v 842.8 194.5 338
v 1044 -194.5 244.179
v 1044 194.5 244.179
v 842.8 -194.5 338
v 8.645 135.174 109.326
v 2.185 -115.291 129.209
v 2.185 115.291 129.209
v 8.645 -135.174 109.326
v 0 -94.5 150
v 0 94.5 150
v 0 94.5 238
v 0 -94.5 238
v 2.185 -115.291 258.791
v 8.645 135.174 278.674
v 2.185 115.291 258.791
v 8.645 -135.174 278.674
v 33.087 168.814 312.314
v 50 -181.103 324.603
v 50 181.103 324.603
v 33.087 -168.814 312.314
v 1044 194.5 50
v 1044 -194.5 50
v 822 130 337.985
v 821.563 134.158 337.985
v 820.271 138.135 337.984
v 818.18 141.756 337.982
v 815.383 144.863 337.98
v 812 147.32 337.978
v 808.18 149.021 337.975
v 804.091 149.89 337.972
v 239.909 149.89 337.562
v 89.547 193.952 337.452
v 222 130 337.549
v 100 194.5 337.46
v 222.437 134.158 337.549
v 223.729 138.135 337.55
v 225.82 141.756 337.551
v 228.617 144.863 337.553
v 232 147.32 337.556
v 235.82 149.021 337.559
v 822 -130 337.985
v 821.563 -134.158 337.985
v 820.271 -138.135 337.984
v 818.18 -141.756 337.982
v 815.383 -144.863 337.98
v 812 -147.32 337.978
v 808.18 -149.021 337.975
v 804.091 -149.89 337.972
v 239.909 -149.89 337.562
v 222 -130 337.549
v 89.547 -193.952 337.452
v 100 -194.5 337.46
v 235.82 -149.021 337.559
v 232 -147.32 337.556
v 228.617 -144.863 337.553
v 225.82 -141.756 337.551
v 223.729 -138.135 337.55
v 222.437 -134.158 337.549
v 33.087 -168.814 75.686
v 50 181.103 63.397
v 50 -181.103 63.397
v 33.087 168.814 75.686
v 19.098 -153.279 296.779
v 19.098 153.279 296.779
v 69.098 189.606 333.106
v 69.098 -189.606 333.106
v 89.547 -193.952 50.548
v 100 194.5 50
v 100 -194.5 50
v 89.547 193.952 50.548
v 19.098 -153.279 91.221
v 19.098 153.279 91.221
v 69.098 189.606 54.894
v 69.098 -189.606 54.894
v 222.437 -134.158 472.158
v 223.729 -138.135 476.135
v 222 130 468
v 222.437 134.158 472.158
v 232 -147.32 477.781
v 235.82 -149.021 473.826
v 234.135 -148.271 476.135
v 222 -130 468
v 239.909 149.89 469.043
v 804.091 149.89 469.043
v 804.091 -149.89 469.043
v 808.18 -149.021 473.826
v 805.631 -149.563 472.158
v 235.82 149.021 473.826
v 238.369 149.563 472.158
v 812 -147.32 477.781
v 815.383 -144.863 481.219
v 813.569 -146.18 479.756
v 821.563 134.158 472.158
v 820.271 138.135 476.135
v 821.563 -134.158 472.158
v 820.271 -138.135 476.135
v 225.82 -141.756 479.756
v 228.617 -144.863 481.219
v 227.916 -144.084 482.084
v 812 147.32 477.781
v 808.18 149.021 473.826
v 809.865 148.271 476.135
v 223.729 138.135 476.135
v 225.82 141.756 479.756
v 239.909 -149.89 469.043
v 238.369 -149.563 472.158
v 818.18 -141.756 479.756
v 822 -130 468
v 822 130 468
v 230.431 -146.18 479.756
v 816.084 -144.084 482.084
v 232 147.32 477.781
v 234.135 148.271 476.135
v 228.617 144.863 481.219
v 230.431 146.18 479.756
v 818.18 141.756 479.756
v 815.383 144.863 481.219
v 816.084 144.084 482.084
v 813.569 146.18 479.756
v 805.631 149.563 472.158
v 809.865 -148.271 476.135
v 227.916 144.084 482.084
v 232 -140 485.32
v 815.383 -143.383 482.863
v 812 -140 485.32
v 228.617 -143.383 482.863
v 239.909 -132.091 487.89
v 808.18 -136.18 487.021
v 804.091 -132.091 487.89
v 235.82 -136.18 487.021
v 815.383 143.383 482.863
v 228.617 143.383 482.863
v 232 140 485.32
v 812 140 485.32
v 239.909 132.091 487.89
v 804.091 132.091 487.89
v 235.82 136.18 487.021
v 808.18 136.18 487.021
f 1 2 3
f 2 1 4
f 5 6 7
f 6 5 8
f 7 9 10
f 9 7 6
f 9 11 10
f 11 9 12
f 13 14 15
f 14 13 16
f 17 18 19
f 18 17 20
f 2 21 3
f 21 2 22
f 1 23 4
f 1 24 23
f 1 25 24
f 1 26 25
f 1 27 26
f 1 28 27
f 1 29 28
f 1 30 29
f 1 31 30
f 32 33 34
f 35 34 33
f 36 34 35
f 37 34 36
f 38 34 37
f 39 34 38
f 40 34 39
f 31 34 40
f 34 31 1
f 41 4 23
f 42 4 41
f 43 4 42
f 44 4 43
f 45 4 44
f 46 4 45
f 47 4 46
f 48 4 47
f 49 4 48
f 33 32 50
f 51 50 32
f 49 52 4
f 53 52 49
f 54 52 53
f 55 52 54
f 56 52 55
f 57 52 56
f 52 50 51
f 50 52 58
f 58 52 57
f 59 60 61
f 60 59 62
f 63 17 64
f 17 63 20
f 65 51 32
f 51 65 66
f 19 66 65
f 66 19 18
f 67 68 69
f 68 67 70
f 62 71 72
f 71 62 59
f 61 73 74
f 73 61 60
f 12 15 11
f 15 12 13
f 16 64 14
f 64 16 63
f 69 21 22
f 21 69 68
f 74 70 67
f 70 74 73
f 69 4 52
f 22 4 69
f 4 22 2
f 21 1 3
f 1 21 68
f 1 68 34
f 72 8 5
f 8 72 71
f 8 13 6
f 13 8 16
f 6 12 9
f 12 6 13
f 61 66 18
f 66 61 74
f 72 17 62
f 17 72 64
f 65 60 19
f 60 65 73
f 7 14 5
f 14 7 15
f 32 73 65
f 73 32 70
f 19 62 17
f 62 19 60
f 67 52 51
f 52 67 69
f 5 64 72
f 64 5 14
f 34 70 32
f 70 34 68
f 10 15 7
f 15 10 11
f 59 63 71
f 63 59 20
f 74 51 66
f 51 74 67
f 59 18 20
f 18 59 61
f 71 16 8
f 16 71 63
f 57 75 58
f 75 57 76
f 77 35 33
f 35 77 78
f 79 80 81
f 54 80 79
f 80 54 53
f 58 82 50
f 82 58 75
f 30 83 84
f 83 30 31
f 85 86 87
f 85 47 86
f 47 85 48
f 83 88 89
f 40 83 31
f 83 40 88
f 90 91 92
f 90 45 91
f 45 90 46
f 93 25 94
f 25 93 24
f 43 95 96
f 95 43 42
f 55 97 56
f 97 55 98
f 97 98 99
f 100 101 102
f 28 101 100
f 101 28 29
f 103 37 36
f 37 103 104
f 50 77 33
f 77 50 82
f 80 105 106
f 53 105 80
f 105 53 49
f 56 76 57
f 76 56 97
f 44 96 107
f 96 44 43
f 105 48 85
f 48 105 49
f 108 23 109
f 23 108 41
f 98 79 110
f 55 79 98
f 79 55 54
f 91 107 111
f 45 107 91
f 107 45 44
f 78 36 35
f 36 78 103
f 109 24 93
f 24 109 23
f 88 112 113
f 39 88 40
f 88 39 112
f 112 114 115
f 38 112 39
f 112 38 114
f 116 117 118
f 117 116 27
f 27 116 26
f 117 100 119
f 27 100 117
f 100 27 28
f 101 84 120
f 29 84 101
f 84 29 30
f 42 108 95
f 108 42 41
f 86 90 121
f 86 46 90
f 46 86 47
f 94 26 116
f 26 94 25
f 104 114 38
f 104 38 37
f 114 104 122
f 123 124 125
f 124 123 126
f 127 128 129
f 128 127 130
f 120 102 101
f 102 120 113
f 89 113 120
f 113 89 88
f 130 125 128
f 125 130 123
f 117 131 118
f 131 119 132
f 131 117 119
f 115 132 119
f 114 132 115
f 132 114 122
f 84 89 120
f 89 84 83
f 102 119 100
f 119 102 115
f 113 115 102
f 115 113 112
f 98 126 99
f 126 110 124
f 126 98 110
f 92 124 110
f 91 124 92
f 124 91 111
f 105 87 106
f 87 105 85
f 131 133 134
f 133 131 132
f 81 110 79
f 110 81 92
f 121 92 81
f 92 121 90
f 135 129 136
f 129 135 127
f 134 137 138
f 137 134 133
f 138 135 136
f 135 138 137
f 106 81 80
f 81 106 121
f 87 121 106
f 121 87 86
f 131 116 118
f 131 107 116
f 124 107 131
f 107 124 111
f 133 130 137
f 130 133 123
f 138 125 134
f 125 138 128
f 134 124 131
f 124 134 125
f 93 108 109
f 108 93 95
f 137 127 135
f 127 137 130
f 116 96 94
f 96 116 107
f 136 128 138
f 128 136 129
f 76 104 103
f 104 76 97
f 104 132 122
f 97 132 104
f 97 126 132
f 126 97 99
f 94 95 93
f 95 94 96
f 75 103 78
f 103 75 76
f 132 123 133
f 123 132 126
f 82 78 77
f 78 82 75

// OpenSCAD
// file: ahmed-25.scad
// Ahmed et al. (1984) body in millimetres. x runs from the nose to the tail,
// y is centred on the symmetry plane and the underside sits `lift` above z = 0,
// the floor the stilts stand on. The rear slant length is measured along the slant.
// Resolution comes from the command line: openscad -D '$fn=96'.

module ahmed_body(slant_deg = 25, lift = 50) {
    length = 1044;
    width = 389;
    height = 288;
    slant_length = 222;
    front_radius = 100;
    slant_dx = slant_length * cos(slant_deg);
    slant_dz = slant_length * sin(slant_deg);

    translate([0, 0, lift])
        intersection() {
            // Side view: round the top and bottom front edges and cut the rear slant.
            rotate([90, 0, 0])
                linear_extrude(height = width, center = true)
                    hull() {
                        for (z = [front_radius, height - front_radius])
                            translate([front_radius, z])
                                circle(r = front_radius);
                        polygon([
                            [front_radius, 0],
                            [length, 0],
                            [length, height - slant_dz],
                            [length - slant_dx, height],
                            [front_radius, height - front_radius]
                        ]);
                    }
            // Plan view: round the two vertical front edges.
            linear_extrude(height = height)
                hull() {
                    for (side = [-1, 1])
                        translate([front_radius, side * (width / 2 - front_radius)])
                            circle(r = front_radius);
                    translate([front_radius, -width / 2])
                        square([length - front_radius, width]);
                }
        }
}

ahmed_body();
// main file
// The 25 degree Ahmed body carrying a 600 x 300 x 150 mm roof box with 20 mm
// rounded vertical and top edges, centred on the body length and the symmetry
// plane. The box starts 1 mm inside the roof so the union has no coplanar faces.
use <ahmed-25.scad>

module roof_box(roof_z, x_centre) {
    length = 600;
    width = 300;
    height = 150;
    radius = 20;
    embed = 1;

    translate([x_centre, 0, roof_z - embed])
        intersection() {
            // Plan view: round the vertical edges.
            linear_extrude(height = height + embed)
                hull()
                    for (sx = [-1, 1], sy = [-1, 1])
                        translate([sx * (length / 2 - radius), sy * (width / 2 - radius)])
                            circle(r = radius);
            // End view: round the top edges along the length.
            rotate([90, 0, 90])
                linear_extrude(height = length, center = true)
                    hull() {
                        for (side = [-1, 1])
                            translate([side * (width / 2 - radius), height + embed - radius])
                                circle(r = radius);
                        translate([-width / 2, 0])
                            square([width, height + embed - radius]);
                    }
            // Side view: round the top edges across the width.
            rotate([90, 0, 0])
                linear_extrude(height = width, center = true)
                    hull() {
                        for (side = [-1, 1])
                            translate([side * (length / 2 - radius), height + embed - radius])
                                circle(r = radius);
                        translate([-length / 2, 0])
                            square([length, height + embed - radius]);
                    }
        }
}

union() {
    ahmed_body(25, 50);
    roof_box(50 + 288, 522);
}
